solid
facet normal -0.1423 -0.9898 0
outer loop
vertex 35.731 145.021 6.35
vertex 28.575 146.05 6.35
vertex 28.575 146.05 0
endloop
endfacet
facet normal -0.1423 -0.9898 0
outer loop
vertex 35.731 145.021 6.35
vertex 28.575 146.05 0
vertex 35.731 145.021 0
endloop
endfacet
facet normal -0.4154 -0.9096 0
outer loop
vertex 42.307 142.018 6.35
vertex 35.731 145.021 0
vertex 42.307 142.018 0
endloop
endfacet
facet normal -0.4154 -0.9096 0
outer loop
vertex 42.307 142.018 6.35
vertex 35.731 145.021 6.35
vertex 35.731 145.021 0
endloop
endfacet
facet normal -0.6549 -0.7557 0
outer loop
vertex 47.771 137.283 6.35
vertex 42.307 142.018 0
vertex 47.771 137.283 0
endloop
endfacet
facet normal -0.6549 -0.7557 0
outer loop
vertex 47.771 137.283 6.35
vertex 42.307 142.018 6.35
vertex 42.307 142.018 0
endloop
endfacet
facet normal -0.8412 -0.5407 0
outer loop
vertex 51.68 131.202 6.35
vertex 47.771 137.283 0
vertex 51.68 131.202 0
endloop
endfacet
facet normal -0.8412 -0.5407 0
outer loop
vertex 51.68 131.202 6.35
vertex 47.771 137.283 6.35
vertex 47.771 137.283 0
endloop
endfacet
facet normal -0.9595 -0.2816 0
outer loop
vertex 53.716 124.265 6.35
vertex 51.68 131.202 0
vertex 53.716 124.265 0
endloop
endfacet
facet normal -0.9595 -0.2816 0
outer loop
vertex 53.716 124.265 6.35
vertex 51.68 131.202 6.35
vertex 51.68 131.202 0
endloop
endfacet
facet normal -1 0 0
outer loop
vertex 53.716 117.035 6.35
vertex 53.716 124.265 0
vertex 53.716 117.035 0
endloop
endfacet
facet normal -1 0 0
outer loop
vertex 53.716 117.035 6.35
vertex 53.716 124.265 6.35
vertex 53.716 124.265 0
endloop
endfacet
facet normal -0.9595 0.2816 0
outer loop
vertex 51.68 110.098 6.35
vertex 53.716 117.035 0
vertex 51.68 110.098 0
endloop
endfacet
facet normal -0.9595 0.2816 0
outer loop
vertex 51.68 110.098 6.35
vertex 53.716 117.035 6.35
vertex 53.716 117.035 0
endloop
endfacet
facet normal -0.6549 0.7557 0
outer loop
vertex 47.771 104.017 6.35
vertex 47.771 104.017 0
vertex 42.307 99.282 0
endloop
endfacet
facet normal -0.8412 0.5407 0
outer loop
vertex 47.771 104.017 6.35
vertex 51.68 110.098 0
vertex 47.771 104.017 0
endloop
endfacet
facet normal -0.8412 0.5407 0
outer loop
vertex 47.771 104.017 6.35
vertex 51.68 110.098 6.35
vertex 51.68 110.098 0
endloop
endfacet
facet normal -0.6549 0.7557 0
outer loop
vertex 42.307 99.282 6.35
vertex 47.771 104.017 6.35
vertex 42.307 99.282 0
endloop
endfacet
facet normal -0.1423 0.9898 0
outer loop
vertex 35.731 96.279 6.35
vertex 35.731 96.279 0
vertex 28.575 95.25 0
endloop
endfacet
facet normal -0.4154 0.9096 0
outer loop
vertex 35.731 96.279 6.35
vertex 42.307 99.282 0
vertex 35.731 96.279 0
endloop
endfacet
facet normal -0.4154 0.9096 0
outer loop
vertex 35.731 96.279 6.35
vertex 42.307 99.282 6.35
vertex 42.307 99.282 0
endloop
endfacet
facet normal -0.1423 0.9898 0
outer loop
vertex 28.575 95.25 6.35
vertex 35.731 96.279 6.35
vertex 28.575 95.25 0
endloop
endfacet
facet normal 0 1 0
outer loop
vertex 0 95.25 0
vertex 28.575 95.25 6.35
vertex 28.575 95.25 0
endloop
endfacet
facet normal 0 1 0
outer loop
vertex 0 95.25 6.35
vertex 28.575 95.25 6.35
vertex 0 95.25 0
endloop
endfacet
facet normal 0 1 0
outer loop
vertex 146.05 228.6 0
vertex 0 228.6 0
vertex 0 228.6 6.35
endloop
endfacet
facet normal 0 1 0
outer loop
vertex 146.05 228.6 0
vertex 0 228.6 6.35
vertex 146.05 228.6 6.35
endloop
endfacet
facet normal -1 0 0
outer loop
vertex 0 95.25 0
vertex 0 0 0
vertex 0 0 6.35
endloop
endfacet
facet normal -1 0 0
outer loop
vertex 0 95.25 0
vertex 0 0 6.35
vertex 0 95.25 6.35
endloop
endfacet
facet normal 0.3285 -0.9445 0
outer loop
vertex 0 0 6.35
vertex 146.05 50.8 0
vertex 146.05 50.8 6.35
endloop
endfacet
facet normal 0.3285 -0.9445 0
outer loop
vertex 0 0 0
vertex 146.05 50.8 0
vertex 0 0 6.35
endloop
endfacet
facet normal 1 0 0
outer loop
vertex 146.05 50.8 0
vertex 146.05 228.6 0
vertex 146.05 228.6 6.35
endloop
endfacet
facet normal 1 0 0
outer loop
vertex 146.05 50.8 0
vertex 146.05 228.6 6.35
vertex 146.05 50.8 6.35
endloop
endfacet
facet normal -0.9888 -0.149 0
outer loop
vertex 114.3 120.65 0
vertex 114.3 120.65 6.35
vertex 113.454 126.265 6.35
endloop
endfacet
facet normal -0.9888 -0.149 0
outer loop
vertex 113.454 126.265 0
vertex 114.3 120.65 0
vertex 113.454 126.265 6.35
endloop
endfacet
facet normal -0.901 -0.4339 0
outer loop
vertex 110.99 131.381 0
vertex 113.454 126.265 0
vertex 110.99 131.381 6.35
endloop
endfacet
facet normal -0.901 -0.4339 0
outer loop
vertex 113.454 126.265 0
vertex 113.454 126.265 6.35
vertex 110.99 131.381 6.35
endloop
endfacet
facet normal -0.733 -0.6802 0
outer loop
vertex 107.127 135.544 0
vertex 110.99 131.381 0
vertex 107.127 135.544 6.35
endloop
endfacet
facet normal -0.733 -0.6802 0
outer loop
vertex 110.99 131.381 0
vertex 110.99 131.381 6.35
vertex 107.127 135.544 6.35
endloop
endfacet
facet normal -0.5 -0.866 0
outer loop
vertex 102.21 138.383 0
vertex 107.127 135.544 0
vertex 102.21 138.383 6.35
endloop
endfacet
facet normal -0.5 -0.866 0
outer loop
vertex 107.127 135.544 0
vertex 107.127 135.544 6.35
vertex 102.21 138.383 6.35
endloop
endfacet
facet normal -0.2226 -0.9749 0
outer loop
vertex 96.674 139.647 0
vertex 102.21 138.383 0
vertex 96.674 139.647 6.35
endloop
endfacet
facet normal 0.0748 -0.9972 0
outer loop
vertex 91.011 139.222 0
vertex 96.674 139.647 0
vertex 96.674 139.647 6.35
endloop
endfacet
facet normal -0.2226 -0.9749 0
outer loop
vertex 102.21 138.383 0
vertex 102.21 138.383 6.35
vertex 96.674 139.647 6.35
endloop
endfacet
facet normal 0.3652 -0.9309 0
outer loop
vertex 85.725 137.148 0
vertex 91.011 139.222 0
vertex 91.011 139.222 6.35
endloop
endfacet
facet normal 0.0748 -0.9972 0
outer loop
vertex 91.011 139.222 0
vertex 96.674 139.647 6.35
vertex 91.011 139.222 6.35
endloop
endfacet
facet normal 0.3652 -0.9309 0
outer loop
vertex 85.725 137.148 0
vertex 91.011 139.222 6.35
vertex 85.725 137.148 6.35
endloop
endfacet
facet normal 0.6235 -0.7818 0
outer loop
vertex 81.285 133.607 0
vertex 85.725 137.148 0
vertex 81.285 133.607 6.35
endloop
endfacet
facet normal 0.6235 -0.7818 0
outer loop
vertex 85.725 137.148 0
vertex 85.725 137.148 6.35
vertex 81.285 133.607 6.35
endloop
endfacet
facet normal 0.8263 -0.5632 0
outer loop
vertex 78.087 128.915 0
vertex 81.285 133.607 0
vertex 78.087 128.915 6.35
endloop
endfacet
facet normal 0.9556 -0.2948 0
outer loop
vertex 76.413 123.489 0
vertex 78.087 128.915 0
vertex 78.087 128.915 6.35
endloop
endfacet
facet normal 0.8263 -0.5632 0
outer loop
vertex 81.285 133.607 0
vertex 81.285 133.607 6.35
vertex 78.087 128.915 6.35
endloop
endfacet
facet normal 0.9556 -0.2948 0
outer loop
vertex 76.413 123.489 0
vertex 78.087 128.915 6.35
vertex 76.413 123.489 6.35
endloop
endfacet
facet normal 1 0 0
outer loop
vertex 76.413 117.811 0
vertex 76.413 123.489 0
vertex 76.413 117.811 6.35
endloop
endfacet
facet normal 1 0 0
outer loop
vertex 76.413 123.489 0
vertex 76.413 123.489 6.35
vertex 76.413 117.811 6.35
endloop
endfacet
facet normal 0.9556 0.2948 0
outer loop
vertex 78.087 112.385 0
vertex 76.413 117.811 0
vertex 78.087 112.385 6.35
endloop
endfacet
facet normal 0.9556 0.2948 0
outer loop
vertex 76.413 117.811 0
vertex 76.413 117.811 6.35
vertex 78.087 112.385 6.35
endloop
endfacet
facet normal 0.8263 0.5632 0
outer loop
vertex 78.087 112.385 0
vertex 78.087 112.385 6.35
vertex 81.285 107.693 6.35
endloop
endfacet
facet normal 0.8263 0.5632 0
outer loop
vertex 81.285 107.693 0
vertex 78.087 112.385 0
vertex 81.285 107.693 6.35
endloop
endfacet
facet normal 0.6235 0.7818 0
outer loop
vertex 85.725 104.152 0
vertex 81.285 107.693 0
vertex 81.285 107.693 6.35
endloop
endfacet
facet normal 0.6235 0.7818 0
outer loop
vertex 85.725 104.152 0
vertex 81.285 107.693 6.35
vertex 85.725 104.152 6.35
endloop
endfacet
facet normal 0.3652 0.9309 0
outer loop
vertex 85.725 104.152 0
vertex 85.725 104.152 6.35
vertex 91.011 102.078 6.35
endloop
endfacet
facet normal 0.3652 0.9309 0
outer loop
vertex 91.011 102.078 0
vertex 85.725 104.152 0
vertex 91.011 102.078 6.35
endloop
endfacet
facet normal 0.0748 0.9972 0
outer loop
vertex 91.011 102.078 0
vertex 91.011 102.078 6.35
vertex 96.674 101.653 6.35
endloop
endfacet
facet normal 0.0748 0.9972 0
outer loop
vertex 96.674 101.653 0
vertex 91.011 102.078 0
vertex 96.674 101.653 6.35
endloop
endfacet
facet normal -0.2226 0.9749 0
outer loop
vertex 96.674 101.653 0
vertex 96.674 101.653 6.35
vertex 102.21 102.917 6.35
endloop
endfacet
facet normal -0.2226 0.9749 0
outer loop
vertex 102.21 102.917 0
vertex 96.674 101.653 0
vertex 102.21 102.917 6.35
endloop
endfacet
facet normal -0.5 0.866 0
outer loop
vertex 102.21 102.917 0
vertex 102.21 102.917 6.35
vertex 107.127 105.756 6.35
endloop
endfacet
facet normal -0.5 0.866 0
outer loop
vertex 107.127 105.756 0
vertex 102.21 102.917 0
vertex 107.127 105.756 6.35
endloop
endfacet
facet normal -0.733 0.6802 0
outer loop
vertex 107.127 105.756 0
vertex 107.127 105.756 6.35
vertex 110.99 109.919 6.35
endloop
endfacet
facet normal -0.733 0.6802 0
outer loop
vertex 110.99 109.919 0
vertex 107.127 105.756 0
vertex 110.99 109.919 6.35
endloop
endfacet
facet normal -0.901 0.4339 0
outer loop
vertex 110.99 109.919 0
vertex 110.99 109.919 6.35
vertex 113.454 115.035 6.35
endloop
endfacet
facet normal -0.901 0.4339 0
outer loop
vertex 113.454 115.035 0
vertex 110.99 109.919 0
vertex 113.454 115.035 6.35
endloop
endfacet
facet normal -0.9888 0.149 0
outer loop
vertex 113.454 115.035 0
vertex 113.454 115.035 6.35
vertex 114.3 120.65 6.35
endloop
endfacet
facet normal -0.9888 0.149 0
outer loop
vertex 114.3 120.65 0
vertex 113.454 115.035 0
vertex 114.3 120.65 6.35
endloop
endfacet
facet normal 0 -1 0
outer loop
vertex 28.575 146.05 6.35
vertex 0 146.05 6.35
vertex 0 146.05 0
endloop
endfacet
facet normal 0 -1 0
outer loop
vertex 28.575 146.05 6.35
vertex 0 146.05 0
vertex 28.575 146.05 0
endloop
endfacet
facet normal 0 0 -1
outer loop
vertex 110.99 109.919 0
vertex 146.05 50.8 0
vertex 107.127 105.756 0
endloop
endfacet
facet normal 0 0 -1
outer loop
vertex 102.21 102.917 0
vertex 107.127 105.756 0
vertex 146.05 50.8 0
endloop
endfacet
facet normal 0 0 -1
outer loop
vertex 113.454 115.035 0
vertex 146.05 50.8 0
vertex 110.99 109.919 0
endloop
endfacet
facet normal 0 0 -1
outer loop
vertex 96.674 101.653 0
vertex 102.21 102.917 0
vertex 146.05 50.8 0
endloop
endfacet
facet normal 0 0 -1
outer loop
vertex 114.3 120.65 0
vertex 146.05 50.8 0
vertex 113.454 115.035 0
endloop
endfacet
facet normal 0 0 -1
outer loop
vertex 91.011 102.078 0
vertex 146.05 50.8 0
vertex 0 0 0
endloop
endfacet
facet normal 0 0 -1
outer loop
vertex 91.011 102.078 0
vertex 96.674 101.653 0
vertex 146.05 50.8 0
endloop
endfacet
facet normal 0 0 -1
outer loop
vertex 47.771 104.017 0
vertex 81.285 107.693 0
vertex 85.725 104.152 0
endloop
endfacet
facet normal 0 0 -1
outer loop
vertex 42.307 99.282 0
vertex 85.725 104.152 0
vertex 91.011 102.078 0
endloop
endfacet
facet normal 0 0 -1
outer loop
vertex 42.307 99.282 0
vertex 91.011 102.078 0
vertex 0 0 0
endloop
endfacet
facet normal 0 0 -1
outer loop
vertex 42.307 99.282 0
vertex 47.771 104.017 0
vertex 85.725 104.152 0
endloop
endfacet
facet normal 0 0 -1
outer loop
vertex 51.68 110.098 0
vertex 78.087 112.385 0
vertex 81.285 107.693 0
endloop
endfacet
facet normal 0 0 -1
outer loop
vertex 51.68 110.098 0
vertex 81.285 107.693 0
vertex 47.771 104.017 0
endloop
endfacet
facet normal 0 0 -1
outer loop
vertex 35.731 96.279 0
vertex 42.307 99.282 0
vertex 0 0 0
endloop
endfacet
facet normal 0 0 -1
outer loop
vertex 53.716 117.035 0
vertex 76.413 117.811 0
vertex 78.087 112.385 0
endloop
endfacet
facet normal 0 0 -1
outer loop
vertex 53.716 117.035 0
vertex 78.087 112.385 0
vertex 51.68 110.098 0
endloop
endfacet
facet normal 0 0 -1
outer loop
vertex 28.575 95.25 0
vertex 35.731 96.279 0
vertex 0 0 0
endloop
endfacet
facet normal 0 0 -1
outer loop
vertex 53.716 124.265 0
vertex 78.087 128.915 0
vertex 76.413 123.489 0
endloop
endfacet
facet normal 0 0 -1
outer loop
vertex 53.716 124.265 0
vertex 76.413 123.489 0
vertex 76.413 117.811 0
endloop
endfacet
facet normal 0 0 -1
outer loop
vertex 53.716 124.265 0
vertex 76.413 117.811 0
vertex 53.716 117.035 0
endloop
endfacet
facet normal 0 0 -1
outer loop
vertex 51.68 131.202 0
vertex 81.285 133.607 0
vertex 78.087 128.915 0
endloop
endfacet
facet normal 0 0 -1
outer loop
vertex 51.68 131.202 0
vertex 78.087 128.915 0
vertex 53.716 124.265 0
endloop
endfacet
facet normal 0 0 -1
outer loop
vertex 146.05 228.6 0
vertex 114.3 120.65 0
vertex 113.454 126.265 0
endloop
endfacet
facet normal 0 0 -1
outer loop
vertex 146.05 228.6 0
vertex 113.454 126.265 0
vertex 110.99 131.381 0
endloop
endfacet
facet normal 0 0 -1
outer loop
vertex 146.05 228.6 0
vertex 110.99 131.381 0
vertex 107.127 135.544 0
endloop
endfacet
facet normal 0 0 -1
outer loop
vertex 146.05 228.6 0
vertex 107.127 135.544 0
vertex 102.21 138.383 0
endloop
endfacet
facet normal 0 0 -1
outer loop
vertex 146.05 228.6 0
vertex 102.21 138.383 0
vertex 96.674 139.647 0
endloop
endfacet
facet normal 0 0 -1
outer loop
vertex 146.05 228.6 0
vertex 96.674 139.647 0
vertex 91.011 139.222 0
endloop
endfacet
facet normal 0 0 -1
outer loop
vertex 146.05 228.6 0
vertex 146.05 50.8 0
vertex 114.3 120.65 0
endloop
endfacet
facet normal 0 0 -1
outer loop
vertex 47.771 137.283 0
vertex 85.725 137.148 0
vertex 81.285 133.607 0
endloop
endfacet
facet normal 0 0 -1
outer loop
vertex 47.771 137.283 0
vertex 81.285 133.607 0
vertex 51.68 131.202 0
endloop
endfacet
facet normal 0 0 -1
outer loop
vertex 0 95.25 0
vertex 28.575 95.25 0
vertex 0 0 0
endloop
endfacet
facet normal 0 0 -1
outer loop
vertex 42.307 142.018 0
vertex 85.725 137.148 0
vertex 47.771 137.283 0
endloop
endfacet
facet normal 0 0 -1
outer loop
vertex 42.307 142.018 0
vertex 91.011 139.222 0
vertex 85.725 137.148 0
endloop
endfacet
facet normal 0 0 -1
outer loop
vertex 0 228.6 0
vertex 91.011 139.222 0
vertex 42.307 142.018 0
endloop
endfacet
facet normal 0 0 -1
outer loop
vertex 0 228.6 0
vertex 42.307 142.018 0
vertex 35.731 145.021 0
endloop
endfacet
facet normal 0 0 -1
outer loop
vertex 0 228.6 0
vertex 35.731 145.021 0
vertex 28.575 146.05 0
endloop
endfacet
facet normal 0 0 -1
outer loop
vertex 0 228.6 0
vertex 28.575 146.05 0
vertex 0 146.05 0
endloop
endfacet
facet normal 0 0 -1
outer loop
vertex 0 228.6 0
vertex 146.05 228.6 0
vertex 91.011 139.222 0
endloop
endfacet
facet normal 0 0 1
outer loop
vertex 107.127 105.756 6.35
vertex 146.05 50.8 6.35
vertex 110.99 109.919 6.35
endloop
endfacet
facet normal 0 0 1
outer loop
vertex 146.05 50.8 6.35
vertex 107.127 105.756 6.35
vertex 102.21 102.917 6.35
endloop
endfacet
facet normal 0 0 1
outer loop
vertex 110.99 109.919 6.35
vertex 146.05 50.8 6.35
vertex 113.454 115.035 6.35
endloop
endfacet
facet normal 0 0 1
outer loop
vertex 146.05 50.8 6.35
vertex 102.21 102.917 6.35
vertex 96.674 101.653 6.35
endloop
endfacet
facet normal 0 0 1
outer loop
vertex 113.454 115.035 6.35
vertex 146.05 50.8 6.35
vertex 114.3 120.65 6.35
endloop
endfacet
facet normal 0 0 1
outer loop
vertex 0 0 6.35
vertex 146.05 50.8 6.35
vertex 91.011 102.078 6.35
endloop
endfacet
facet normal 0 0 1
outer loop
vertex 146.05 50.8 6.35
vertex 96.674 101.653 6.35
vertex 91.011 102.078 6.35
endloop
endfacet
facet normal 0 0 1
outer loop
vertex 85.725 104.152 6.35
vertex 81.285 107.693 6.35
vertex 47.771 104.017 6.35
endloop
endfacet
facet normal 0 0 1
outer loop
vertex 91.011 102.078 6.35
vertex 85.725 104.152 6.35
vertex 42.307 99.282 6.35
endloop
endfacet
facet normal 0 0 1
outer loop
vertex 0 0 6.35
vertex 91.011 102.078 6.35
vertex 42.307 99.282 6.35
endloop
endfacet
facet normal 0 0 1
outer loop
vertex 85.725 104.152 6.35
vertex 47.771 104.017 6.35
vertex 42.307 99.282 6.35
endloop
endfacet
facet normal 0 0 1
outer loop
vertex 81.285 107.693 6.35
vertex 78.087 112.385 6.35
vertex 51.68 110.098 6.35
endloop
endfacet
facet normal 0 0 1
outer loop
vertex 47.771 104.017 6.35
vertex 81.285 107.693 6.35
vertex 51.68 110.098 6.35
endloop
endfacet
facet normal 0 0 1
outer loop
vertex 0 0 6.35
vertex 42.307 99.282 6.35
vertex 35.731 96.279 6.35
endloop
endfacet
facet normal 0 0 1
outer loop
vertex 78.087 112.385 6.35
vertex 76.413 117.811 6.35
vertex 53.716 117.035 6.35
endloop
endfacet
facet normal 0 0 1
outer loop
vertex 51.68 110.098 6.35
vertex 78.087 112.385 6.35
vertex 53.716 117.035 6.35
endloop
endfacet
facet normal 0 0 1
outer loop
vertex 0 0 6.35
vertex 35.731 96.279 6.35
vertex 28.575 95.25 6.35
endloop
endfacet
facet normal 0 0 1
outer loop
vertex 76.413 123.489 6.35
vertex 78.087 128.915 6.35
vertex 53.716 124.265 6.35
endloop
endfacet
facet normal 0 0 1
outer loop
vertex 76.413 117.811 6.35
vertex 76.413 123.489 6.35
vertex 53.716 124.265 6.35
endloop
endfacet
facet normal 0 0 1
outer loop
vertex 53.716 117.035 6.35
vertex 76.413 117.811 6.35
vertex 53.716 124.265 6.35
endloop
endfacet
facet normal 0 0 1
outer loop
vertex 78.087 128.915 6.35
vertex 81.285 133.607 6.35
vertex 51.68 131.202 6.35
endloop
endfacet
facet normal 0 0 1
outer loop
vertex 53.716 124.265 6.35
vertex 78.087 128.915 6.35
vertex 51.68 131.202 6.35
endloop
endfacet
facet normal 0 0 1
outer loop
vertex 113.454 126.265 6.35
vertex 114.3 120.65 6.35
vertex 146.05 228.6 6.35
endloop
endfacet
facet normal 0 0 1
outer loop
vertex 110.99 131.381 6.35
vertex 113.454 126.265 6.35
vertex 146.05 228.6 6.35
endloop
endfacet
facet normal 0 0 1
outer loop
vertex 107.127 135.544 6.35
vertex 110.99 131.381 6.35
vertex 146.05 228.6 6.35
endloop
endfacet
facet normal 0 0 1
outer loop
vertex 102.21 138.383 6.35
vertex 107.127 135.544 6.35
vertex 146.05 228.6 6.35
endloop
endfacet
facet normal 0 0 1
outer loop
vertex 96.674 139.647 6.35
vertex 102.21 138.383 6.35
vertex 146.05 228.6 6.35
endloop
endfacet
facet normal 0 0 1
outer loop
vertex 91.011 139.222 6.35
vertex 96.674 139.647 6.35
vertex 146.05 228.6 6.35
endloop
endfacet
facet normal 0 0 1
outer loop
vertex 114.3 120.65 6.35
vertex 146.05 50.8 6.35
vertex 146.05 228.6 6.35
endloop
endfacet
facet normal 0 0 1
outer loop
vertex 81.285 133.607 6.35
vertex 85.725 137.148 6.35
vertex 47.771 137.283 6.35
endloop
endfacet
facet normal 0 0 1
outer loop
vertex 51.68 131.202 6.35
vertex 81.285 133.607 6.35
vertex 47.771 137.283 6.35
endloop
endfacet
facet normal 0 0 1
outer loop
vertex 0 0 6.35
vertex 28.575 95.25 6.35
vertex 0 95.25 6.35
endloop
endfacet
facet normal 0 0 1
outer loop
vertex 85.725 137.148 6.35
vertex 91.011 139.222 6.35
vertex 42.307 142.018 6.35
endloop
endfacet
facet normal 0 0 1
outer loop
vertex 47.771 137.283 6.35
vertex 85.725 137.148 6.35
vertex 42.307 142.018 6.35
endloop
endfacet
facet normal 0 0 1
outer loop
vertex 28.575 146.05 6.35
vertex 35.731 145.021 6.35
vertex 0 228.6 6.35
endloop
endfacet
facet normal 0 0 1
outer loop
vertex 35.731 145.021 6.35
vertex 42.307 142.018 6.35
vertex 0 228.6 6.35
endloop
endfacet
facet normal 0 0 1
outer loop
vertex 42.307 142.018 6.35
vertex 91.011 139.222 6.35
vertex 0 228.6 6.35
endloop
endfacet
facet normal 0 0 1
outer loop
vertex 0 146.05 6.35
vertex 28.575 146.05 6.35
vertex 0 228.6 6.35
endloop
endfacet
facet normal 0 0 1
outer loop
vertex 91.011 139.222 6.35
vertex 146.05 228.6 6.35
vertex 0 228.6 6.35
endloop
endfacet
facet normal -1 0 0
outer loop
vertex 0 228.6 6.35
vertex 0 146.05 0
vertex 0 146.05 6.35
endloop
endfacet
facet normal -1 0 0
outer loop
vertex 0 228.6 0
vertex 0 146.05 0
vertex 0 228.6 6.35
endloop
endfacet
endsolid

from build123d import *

# Parameters (mm, degrees)
BOSS_EXTRUDE1_DEPTH = 6.35
SKETCH2_R           = 19.05
CUT_EXTRUDE1_DEPTH  = 7.35


with BuildPart() as part:
    # Sketch1 → Boss-Extrude1 (new body)
    with BuildSketch(Plane.XY):
        Polygon((0, 0), (0, 228.6), (146.05, 228.6), (146.05, 50.8), align=None)
    extrude(amount=BOSS_EXTRUDE1_DEPTH)

    # Sketch2 → Cut-Extrude1 (cut, through all)
    with BuildSketch(Plane.XY.offset(6.35)):
        with Locations((95.25, 120.65)):
            Circle(SKETCH2_R)
        with BuildLine():
            Line((0, 146.05), (28.575, 146.05))
            ThreePointArc((28.575, 146.05), (53.975, 120.65), (28.575, 95.25))
            Line((28.575, 95.25), (0, 95.25))
            ThreePointArc((0, 95.25), (-25.4, 120.65), (0, 146.05))
        make_face()
    extrude(amount=-CUT_EXTRUDE1_DEPTH, mode=Mode.SUBTRACT)


solid = part.part
